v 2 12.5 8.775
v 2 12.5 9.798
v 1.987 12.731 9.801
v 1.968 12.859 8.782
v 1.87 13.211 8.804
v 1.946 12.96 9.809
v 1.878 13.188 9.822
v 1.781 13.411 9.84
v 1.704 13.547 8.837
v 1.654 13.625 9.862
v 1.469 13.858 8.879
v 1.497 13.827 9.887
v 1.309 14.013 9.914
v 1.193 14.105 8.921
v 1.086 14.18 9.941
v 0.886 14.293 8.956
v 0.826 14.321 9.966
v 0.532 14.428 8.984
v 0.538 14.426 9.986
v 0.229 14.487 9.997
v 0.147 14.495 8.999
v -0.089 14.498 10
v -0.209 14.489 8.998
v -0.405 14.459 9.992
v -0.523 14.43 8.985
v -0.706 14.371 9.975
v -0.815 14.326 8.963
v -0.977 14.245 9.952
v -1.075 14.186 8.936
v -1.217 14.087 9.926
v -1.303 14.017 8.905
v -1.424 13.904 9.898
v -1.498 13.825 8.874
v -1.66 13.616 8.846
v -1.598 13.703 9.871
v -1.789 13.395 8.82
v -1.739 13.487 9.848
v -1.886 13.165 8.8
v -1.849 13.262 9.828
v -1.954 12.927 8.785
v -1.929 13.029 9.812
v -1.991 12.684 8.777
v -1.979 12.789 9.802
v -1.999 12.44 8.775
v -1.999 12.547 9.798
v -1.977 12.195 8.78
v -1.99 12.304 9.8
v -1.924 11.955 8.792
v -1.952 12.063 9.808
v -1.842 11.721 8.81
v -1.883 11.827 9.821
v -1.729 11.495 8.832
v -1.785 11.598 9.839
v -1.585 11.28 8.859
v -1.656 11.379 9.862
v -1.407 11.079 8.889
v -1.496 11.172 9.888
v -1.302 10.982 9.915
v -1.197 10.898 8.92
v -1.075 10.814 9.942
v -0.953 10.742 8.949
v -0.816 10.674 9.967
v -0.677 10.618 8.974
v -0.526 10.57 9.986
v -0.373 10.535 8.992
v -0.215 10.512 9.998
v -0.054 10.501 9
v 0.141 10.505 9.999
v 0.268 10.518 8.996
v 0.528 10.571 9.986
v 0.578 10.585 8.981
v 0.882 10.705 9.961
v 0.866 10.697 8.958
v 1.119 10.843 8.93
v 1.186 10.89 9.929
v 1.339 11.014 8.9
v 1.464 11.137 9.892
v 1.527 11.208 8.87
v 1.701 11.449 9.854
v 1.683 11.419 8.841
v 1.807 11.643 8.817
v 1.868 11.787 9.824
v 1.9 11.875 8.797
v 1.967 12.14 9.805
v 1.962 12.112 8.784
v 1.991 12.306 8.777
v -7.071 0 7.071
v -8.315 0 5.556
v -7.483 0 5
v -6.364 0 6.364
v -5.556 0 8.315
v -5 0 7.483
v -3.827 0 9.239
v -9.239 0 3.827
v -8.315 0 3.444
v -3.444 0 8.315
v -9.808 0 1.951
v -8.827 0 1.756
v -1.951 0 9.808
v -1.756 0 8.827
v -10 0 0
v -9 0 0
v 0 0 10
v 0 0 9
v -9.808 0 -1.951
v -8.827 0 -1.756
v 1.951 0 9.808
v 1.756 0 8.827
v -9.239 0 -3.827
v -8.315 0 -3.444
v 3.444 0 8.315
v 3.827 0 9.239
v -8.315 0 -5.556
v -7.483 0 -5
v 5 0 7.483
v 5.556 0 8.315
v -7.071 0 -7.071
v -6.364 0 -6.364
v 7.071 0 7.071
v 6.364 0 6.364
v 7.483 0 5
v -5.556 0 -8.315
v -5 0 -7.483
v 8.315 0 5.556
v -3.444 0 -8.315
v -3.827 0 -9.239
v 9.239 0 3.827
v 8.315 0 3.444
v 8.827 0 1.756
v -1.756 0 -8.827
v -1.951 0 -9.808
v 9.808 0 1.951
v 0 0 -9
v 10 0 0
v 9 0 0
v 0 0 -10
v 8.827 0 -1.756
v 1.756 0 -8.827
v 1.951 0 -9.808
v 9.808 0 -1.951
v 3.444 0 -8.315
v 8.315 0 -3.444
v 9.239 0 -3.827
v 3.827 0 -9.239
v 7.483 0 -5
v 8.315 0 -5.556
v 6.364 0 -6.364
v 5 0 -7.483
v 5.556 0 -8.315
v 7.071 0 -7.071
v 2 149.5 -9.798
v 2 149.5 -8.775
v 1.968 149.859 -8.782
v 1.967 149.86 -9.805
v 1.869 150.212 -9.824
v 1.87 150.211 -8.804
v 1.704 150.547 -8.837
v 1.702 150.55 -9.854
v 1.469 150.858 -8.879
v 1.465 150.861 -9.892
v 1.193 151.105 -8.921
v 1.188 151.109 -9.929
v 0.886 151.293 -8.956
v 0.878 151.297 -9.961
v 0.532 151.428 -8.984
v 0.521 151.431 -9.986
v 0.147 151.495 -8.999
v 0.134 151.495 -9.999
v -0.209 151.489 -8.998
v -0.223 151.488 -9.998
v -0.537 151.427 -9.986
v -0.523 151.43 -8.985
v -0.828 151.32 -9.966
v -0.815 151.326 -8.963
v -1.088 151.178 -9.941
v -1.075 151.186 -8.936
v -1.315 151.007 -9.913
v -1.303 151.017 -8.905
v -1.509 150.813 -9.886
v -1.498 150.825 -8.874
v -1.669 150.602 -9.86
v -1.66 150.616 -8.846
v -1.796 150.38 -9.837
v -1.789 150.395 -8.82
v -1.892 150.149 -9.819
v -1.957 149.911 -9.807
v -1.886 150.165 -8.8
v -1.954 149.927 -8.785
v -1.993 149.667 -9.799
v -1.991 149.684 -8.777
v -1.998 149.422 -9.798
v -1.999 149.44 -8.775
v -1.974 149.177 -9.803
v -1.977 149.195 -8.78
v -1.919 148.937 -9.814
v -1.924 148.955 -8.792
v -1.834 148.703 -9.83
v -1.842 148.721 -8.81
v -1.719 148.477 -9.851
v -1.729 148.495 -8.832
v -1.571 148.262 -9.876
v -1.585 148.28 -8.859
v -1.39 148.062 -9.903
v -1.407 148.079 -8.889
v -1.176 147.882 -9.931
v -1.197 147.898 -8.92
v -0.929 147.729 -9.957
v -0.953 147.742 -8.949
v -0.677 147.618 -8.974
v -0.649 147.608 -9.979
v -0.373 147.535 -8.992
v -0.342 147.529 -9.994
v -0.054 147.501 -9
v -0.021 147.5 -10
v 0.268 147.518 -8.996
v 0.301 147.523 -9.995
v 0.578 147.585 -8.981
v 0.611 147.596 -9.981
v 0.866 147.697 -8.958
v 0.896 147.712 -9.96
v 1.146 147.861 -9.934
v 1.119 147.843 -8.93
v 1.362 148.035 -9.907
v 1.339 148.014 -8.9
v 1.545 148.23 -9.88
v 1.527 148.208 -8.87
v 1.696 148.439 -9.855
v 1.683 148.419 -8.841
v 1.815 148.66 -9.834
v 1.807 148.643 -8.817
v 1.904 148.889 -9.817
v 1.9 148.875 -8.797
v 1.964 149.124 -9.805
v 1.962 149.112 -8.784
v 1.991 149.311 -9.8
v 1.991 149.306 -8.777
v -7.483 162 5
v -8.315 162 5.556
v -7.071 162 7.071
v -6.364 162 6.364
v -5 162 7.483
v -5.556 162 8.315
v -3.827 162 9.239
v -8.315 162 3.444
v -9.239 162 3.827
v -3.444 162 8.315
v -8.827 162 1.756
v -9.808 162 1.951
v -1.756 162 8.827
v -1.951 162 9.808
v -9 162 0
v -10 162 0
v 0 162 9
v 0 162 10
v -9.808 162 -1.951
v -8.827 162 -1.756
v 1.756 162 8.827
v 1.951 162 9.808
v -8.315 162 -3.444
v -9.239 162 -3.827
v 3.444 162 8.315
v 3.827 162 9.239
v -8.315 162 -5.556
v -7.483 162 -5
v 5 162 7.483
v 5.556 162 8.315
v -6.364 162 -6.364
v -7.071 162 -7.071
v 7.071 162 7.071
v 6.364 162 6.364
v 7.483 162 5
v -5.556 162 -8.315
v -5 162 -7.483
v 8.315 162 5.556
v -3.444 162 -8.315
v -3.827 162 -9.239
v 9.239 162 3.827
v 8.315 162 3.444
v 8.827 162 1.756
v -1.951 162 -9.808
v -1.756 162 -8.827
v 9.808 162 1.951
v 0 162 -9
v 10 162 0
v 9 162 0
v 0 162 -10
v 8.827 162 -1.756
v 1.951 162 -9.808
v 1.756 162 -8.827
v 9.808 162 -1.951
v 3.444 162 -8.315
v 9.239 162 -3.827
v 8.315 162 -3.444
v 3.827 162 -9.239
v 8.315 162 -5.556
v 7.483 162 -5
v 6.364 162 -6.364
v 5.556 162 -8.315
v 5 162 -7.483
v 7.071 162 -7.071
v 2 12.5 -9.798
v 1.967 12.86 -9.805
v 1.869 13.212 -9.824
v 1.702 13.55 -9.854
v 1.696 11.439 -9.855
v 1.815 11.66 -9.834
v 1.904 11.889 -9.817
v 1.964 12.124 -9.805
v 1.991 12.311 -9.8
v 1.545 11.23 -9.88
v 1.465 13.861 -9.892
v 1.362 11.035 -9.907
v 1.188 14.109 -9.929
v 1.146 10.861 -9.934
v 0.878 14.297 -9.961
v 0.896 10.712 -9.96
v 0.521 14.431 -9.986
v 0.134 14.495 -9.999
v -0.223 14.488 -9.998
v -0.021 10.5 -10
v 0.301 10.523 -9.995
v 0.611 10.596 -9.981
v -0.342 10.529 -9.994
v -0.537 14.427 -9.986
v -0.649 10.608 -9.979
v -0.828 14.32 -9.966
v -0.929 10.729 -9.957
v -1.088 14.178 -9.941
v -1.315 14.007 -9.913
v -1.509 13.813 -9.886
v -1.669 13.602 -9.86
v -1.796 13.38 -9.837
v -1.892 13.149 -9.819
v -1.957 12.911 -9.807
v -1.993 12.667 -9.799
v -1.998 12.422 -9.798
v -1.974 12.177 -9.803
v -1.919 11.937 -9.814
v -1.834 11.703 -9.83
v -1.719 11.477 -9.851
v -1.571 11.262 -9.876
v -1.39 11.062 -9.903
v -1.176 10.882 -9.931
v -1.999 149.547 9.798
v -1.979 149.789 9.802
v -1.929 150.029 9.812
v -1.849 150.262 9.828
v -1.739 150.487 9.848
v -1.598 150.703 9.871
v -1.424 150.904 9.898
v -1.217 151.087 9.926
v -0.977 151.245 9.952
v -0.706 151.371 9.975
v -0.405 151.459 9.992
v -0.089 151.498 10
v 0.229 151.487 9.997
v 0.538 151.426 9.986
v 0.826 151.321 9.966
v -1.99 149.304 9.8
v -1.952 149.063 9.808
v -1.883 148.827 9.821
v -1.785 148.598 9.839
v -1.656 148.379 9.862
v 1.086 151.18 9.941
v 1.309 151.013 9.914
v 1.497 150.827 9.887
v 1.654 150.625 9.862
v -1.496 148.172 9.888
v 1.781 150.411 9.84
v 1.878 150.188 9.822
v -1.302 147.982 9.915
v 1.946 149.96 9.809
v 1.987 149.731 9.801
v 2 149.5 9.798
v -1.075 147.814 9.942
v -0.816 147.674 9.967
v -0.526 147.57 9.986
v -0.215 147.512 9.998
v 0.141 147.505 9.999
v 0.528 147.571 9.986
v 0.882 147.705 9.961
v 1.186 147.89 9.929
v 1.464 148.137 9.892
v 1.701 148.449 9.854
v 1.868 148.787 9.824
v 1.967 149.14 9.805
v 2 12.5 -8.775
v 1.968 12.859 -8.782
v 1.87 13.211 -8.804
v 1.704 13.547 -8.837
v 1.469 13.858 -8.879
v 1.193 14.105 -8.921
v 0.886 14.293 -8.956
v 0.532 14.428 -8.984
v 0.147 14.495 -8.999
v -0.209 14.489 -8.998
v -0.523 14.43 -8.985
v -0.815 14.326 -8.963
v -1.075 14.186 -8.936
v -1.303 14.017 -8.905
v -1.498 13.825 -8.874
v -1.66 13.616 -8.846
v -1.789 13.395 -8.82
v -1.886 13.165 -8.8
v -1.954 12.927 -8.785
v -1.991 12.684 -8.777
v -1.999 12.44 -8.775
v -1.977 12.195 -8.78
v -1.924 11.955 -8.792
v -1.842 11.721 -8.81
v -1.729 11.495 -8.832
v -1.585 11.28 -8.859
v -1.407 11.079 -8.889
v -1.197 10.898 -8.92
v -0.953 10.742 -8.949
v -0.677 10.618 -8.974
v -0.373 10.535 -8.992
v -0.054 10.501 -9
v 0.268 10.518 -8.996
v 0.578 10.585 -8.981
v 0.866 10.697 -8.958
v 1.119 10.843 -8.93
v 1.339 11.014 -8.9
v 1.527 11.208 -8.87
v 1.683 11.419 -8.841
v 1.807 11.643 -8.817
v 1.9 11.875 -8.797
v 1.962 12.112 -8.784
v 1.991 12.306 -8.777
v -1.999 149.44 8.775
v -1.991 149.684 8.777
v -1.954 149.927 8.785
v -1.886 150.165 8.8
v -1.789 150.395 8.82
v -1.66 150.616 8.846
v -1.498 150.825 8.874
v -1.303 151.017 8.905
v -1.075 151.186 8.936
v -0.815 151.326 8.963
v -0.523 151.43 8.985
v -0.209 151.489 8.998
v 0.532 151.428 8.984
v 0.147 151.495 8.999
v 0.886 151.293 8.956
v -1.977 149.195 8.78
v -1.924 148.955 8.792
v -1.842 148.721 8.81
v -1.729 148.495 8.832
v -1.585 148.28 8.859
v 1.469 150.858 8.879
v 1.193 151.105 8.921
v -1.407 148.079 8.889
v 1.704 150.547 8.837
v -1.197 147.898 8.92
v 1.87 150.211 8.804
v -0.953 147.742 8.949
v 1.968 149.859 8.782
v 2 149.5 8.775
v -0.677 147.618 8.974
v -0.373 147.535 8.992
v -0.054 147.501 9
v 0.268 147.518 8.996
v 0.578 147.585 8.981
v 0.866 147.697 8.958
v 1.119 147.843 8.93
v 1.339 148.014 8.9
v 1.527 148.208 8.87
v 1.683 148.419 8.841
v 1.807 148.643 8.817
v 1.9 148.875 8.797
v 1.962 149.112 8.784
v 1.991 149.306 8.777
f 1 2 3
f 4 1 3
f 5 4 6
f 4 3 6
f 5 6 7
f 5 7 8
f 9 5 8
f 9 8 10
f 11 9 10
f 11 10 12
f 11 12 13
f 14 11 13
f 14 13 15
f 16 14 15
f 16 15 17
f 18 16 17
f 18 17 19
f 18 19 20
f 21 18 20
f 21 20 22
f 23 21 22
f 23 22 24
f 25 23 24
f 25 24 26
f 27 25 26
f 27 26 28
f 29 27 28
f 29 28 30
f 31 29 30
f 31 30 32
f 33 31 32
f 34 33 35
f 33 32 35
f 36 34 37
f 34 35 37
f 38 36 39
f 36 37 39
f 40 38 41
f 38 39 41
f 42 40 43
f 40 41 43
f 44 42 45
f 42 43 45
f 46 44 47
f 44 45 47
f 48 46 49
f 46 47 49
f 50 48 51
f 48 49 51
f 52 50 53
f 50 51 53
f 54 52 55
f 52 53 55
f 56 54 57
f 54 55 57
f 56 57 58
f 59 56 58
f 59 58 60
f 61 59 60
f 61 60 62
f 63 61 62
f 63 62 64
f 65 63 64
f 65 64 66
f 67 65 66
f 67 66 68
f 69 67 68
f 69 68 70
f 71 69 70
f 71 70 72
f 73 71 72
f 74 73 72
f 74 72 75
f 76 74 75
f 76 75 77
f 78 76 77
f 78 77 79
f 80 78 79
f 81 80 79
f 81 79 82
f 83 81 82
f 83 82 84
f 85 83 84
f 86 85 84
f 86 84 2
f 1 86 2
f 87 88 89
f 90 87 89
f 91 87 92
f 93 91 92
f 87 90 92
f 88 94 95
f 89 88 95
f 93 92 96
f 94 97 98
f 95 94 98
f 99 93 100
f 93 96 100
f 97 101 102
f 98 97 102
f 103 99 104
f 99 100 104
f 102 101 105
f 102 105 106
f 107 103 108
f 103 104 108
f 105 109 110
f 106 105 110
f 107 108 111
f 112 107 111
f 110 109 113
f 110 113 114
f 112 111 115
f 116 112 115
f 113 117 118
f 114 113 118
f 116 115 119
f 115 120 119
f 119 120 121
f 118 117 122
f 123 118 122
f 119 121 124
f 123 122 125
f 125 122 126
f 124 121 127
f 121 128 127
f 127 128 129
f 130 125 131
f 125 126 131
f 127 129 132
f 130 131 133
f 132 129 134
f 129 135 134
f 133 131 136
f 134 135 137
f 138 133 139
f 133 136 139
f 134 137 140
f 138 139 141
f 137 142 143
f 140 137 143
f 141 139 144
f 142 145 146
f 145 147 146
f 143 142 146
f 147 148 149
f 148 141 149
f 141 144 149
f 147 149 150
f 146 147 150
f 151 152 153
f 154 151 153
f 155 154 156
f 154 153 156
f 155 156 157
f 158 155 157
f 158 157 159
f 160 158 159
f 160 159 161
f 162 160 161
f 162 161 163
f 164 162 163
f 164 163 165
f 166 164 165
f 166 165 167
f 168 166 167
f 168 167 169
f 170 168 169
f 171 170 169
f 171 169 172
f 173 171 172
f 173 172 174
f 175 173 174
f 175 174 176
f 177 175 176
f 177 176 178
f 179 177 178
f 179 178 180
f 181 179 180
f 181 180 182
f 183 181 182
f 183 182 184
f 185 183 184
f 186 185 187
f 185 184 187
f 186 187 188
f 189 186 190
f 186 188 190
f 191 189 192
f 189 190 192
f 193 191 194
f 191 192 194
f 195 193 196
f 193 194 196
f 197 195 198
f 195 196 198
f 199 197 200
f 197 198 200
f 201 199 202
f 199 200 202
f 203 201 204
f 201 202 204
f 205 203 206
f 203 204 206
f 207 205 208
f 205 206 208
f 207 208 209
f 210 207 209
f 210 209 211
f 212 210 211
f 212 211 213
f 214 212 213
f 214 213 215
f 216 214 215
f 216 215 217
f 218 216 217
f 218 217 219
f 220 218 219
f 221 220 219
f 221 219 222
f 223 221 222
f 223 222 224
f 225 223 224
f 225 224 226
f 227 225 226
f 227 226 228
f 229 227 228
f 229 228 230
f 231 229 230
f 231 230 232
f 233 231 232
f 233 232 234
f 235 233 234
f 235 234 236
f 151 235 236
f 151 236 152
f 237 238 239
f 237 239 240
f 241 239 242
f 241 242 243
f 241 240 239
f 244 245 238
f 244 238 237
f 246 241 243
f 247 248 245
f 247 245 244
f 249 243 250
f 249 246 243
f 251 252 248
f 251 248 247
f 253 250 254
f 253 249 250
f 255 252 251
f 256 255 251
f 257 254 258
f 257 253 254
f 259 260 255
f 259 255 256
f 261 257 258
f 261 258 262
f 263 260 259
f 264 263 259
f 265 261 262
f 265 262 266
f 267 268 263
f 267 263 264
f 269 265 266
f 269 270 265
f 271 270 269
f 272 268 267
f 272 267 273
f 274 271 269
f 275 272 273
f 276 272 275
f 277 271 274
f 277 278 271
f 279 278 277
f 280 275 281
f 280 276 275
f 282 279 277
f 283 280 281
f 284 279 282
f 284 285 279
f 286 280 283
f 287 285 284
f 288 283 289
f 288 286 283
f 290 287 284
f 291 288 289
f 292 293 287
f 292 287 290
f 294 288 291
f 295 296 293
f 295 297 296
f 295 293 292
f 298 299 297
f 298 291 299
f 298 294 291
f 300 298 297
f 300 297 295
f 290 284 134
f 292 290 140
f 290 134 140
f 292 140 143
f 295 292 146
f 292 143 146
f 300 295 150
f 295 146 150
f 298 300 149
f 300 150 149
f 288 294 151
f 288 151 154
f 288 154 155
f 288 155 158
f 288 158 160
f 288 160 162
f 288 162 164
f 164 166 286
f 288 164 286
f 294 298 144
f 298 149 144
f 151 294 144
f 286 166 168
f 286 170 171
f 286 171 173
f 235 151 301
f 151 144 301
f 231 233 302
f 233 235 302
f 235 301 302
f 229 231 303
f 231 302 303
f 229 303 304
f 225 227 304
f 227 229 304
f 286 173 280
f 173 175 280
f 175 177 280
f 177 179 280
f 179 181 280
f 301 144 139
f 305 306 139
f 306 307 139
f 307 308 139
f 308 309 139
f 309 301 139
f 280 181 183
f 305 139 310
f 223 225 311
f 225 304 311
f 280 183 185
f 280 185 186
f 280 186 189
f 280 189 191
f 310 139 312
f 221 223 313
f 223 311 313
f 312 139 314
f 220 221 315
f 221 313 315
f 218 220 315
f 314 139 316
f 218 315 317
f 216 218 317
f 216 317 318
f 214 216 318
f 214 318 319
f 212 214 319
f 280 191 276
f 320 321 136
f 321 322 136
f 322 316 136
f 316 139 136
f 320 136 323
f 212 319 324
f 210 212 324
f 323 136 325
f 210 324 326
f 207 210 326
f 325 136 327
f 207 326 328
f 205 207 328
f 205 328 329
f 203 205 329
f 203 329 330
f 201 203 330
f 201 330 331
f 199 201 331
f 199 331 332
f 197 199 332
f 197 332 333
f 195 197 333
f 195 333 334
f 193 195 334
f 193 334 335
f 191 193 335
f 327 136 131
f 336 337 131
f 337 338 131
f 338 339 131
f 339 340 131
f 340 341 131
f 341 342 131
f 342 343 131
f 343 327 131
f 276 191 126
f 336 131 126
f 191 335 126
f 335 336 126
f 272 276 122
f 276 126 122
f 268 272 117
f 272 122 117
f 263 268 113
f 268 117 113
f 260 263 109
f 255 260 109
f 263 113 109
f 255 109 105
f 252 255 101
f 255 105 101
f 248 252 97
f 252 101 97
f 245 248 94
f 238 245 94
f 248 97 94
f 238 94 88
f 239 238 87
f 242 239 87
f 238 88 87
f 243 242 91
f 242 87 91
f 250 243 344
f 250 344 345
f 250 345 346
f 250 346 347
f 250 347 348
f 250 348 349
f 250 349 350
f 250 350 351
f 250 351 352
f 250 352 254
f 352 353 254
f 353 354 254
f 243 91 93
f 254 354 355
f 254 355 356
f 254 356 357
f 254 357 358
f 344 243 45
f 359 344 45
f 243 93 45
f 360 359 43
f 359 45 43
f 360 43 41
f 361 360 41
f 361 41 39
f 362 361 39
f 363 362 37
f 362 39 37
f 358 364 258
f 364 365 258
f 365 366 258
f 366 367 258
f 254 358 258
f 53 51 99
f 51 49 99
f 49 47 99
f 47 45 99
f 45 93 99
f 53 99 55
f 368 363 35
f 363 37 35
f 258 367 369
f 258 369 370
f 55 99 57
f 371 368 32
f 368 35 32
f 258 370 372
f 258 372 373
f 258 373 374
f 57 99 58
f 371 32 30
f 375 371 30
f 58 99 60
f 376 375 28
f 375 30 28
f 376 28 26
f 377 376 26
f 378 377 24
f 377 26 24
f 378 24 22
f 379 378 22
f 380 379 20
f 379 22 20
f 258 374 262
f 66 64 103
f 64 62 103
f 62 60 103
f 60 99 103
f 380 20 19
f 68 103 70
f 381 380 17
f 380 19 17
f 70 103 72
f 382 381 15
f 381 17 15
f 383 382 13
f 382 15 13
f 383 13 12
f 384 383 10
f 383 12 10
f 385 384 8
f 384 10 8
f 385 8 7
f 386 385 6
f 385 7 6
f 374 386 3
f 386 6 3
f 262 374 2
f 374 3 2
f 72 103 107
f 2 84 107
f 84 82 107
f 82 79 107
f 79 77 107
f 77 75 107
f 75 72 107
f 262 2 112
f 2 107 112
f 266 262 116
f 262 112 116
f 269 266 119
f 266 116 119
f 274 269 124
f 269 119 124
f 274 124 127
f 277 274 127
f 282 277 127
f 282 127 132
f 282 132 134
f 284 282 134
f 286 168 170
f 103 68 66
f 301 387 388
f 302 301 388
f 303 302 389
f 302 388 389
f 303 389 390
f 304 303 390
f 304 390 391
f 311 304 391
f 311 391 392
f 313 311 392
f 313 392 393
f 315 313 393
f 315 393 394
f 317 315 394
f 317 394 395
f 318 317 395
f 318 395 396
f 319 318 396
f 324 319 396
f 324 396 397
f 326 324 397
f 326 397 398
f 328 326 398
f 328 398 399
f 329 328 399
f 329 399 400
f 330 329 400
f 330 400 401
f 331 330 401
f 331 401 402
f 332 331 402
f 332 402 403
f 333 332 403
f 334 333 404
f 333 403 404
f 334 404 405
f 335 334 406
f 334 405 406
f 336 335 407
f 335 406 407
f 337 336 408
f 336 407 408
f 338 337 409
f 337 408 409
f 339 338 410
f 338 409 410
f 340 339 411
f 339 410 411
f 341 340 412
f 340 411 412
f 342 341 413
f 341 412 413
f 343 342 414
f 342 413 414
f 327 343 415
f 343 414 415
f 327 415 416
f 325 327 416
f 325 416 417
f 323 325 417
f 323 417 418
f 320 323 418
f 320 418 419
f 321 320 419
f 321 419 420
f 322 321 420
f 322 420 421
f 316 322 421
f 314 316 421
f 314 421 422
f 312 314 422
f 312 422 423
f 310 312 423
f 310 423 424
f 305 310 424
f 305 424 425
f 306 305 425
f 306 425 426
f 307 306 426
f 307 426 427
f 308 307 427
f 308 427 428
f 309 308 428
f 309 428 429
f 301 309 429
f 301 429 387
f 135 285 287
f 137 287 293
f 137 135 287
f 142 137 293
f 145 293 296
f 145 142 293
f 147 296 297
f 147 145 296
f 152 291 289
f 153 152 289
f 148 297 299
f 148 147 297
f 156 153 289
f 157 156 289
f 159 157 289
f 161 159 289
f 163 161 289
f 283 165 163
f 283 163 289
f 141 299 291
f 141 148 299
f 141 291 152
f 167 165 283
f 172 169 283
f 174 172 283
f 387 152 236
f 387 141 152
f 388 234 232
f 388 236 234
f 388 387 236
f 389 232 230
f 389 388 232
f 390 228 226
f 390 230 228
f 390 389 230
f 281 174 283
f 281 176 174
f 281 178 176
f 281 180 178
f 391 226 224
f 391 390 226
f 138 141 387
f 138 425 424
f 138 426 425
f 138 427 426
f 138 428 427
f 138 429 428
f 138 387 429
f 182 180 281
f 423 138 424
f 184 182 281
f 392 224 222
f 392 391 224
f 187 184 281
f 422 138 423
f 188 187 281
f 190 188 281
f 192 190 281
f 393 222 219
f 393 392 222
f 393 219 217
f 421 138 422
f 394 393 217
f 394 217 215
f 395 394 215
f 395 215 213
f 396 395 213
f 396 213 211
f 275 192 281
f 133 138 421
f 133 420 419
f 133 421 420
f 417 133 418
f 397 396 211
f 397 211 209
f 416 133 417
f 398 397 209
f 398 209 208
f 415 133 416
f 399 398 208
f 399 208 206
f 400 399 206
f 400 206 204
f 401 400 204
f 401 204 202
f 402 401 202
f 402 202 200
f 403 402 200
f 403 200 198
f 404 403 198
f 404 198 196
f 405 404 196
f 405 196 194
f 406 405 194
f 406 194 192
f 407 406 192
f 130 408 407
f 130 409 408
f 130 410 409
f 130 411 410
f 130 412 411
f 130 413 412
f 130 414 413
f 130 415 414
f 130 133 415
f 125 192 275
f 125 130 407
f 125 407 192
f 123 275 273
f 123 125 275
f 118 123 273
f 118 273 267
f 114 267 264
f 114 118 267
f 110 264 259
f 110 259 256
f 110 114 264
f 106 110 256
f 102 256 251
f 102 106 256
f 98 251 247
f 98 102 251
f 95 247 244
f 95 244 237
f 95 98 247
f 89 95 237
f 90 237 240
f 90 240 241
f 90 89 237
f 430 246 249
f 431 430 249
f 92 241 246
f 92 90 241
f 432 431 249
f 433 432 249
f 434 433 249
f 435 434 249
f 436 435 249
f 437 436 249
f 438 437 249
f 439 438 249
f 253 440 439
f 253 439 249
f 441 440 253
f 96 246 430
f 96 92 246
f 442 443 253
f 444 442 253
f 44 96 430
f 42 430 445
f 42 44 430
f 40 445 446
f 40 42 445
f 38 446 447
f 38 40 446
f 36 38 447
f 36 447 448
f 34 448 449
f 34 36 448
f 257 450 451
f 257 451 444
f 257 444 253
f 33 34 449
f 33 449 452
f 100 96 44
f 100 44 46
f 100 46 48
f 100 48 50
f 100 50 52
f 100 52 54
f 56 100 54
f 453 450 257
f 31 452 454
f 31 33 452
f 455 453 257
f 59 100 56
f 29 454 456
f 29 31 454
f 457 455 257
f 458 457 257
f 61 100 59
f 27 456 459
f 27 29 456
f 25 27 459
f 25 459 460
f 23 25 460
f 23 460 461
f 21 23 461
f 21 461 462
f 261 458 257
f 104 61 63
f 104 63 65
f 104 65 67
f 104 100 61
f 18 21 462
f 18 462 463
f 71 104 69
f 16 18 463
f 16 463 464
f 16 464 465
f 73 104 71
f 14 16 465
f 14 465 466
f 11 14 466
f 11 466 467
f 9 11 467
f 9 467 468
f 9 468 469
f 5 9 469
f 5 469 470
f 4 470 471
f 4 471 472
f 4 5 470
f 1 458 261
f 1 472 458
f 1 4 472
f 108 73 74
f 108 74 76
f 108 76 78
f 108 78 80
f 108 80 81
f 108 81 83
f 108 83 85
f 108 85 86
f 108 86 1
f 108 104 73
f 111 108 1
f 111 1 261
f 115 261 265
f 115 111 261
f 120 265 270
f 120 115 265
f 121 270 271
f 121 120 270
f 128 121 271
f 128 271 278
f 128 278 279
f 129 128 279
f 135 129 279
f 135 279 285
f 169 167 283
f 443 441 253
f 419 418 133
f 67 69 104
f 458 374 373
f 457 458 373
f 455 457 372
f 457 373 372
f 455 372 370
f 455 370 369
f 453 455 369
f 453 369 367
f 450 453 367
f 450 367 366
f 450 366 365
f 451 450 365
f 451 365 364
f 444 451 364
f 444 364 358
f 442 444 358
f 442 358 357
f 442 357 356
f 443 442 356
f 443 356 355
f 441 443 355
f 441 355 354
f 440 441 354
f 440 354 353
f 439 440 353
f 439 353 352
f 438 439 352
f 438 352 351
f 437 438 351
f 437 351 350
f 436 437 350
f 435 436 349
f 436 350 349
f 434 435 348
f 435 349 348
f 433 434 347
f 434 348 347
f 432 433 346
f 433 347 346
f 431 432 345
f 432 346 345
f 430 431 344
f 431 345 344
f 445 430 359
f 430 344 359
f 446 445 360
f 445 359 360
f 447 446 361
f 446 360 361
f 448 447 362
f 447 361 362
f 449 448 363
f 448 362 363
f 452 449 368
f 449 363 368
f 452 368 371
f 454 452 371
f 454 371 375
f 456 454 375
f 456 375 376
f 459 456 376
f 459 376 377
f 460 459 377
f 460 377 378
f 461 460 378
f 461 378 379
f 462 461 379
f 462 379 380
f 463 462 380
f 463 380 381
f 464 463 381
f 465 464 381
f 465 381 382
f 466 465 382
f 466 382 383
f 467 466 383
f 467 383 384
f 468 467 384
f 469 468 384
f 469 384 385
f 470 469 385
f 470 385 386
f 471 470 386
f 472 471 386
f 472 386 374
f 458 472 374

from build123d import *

# Parameters (mm, degrees)
SKETCH1_R           = 10
SKETCH1_R_2         = 9
BOSS_EXTRUDE1_DEPTH = 162
SKETCH3_R           = 2
CUT_EXTRUDE2_DEPTH  = 21


with BuildPart() as part:
    # Sketch1 → Boss-Extrude1 (new body)
    with BuildSketch(Plane(origin=(0, 0, 0), x_dir=(1, 0, 0), z_dir=(0, 1, 0))):
        Circle(SKETCH1_R)
        Circle(SKETCH1_R_2, mode=Mode.SUBTRACT)
    extrude(amount=BOSS_EXTRUDE1_DEPTH)

    # Sketch3 → Cut-Extrude2 (cut, through all)
    with BuildSketch(Plane.XY.offset(10)):
        with Locations((0, 149.5)):
            Circle(SKETCH3_R)
        with Locations((0, 12.5)):
            Circle(SKETCH3_R)
    extrude(amount=-CUT_EXTRUDE2_DEPTH, mode=Mode.SUBTRACT)


solid = part.part
